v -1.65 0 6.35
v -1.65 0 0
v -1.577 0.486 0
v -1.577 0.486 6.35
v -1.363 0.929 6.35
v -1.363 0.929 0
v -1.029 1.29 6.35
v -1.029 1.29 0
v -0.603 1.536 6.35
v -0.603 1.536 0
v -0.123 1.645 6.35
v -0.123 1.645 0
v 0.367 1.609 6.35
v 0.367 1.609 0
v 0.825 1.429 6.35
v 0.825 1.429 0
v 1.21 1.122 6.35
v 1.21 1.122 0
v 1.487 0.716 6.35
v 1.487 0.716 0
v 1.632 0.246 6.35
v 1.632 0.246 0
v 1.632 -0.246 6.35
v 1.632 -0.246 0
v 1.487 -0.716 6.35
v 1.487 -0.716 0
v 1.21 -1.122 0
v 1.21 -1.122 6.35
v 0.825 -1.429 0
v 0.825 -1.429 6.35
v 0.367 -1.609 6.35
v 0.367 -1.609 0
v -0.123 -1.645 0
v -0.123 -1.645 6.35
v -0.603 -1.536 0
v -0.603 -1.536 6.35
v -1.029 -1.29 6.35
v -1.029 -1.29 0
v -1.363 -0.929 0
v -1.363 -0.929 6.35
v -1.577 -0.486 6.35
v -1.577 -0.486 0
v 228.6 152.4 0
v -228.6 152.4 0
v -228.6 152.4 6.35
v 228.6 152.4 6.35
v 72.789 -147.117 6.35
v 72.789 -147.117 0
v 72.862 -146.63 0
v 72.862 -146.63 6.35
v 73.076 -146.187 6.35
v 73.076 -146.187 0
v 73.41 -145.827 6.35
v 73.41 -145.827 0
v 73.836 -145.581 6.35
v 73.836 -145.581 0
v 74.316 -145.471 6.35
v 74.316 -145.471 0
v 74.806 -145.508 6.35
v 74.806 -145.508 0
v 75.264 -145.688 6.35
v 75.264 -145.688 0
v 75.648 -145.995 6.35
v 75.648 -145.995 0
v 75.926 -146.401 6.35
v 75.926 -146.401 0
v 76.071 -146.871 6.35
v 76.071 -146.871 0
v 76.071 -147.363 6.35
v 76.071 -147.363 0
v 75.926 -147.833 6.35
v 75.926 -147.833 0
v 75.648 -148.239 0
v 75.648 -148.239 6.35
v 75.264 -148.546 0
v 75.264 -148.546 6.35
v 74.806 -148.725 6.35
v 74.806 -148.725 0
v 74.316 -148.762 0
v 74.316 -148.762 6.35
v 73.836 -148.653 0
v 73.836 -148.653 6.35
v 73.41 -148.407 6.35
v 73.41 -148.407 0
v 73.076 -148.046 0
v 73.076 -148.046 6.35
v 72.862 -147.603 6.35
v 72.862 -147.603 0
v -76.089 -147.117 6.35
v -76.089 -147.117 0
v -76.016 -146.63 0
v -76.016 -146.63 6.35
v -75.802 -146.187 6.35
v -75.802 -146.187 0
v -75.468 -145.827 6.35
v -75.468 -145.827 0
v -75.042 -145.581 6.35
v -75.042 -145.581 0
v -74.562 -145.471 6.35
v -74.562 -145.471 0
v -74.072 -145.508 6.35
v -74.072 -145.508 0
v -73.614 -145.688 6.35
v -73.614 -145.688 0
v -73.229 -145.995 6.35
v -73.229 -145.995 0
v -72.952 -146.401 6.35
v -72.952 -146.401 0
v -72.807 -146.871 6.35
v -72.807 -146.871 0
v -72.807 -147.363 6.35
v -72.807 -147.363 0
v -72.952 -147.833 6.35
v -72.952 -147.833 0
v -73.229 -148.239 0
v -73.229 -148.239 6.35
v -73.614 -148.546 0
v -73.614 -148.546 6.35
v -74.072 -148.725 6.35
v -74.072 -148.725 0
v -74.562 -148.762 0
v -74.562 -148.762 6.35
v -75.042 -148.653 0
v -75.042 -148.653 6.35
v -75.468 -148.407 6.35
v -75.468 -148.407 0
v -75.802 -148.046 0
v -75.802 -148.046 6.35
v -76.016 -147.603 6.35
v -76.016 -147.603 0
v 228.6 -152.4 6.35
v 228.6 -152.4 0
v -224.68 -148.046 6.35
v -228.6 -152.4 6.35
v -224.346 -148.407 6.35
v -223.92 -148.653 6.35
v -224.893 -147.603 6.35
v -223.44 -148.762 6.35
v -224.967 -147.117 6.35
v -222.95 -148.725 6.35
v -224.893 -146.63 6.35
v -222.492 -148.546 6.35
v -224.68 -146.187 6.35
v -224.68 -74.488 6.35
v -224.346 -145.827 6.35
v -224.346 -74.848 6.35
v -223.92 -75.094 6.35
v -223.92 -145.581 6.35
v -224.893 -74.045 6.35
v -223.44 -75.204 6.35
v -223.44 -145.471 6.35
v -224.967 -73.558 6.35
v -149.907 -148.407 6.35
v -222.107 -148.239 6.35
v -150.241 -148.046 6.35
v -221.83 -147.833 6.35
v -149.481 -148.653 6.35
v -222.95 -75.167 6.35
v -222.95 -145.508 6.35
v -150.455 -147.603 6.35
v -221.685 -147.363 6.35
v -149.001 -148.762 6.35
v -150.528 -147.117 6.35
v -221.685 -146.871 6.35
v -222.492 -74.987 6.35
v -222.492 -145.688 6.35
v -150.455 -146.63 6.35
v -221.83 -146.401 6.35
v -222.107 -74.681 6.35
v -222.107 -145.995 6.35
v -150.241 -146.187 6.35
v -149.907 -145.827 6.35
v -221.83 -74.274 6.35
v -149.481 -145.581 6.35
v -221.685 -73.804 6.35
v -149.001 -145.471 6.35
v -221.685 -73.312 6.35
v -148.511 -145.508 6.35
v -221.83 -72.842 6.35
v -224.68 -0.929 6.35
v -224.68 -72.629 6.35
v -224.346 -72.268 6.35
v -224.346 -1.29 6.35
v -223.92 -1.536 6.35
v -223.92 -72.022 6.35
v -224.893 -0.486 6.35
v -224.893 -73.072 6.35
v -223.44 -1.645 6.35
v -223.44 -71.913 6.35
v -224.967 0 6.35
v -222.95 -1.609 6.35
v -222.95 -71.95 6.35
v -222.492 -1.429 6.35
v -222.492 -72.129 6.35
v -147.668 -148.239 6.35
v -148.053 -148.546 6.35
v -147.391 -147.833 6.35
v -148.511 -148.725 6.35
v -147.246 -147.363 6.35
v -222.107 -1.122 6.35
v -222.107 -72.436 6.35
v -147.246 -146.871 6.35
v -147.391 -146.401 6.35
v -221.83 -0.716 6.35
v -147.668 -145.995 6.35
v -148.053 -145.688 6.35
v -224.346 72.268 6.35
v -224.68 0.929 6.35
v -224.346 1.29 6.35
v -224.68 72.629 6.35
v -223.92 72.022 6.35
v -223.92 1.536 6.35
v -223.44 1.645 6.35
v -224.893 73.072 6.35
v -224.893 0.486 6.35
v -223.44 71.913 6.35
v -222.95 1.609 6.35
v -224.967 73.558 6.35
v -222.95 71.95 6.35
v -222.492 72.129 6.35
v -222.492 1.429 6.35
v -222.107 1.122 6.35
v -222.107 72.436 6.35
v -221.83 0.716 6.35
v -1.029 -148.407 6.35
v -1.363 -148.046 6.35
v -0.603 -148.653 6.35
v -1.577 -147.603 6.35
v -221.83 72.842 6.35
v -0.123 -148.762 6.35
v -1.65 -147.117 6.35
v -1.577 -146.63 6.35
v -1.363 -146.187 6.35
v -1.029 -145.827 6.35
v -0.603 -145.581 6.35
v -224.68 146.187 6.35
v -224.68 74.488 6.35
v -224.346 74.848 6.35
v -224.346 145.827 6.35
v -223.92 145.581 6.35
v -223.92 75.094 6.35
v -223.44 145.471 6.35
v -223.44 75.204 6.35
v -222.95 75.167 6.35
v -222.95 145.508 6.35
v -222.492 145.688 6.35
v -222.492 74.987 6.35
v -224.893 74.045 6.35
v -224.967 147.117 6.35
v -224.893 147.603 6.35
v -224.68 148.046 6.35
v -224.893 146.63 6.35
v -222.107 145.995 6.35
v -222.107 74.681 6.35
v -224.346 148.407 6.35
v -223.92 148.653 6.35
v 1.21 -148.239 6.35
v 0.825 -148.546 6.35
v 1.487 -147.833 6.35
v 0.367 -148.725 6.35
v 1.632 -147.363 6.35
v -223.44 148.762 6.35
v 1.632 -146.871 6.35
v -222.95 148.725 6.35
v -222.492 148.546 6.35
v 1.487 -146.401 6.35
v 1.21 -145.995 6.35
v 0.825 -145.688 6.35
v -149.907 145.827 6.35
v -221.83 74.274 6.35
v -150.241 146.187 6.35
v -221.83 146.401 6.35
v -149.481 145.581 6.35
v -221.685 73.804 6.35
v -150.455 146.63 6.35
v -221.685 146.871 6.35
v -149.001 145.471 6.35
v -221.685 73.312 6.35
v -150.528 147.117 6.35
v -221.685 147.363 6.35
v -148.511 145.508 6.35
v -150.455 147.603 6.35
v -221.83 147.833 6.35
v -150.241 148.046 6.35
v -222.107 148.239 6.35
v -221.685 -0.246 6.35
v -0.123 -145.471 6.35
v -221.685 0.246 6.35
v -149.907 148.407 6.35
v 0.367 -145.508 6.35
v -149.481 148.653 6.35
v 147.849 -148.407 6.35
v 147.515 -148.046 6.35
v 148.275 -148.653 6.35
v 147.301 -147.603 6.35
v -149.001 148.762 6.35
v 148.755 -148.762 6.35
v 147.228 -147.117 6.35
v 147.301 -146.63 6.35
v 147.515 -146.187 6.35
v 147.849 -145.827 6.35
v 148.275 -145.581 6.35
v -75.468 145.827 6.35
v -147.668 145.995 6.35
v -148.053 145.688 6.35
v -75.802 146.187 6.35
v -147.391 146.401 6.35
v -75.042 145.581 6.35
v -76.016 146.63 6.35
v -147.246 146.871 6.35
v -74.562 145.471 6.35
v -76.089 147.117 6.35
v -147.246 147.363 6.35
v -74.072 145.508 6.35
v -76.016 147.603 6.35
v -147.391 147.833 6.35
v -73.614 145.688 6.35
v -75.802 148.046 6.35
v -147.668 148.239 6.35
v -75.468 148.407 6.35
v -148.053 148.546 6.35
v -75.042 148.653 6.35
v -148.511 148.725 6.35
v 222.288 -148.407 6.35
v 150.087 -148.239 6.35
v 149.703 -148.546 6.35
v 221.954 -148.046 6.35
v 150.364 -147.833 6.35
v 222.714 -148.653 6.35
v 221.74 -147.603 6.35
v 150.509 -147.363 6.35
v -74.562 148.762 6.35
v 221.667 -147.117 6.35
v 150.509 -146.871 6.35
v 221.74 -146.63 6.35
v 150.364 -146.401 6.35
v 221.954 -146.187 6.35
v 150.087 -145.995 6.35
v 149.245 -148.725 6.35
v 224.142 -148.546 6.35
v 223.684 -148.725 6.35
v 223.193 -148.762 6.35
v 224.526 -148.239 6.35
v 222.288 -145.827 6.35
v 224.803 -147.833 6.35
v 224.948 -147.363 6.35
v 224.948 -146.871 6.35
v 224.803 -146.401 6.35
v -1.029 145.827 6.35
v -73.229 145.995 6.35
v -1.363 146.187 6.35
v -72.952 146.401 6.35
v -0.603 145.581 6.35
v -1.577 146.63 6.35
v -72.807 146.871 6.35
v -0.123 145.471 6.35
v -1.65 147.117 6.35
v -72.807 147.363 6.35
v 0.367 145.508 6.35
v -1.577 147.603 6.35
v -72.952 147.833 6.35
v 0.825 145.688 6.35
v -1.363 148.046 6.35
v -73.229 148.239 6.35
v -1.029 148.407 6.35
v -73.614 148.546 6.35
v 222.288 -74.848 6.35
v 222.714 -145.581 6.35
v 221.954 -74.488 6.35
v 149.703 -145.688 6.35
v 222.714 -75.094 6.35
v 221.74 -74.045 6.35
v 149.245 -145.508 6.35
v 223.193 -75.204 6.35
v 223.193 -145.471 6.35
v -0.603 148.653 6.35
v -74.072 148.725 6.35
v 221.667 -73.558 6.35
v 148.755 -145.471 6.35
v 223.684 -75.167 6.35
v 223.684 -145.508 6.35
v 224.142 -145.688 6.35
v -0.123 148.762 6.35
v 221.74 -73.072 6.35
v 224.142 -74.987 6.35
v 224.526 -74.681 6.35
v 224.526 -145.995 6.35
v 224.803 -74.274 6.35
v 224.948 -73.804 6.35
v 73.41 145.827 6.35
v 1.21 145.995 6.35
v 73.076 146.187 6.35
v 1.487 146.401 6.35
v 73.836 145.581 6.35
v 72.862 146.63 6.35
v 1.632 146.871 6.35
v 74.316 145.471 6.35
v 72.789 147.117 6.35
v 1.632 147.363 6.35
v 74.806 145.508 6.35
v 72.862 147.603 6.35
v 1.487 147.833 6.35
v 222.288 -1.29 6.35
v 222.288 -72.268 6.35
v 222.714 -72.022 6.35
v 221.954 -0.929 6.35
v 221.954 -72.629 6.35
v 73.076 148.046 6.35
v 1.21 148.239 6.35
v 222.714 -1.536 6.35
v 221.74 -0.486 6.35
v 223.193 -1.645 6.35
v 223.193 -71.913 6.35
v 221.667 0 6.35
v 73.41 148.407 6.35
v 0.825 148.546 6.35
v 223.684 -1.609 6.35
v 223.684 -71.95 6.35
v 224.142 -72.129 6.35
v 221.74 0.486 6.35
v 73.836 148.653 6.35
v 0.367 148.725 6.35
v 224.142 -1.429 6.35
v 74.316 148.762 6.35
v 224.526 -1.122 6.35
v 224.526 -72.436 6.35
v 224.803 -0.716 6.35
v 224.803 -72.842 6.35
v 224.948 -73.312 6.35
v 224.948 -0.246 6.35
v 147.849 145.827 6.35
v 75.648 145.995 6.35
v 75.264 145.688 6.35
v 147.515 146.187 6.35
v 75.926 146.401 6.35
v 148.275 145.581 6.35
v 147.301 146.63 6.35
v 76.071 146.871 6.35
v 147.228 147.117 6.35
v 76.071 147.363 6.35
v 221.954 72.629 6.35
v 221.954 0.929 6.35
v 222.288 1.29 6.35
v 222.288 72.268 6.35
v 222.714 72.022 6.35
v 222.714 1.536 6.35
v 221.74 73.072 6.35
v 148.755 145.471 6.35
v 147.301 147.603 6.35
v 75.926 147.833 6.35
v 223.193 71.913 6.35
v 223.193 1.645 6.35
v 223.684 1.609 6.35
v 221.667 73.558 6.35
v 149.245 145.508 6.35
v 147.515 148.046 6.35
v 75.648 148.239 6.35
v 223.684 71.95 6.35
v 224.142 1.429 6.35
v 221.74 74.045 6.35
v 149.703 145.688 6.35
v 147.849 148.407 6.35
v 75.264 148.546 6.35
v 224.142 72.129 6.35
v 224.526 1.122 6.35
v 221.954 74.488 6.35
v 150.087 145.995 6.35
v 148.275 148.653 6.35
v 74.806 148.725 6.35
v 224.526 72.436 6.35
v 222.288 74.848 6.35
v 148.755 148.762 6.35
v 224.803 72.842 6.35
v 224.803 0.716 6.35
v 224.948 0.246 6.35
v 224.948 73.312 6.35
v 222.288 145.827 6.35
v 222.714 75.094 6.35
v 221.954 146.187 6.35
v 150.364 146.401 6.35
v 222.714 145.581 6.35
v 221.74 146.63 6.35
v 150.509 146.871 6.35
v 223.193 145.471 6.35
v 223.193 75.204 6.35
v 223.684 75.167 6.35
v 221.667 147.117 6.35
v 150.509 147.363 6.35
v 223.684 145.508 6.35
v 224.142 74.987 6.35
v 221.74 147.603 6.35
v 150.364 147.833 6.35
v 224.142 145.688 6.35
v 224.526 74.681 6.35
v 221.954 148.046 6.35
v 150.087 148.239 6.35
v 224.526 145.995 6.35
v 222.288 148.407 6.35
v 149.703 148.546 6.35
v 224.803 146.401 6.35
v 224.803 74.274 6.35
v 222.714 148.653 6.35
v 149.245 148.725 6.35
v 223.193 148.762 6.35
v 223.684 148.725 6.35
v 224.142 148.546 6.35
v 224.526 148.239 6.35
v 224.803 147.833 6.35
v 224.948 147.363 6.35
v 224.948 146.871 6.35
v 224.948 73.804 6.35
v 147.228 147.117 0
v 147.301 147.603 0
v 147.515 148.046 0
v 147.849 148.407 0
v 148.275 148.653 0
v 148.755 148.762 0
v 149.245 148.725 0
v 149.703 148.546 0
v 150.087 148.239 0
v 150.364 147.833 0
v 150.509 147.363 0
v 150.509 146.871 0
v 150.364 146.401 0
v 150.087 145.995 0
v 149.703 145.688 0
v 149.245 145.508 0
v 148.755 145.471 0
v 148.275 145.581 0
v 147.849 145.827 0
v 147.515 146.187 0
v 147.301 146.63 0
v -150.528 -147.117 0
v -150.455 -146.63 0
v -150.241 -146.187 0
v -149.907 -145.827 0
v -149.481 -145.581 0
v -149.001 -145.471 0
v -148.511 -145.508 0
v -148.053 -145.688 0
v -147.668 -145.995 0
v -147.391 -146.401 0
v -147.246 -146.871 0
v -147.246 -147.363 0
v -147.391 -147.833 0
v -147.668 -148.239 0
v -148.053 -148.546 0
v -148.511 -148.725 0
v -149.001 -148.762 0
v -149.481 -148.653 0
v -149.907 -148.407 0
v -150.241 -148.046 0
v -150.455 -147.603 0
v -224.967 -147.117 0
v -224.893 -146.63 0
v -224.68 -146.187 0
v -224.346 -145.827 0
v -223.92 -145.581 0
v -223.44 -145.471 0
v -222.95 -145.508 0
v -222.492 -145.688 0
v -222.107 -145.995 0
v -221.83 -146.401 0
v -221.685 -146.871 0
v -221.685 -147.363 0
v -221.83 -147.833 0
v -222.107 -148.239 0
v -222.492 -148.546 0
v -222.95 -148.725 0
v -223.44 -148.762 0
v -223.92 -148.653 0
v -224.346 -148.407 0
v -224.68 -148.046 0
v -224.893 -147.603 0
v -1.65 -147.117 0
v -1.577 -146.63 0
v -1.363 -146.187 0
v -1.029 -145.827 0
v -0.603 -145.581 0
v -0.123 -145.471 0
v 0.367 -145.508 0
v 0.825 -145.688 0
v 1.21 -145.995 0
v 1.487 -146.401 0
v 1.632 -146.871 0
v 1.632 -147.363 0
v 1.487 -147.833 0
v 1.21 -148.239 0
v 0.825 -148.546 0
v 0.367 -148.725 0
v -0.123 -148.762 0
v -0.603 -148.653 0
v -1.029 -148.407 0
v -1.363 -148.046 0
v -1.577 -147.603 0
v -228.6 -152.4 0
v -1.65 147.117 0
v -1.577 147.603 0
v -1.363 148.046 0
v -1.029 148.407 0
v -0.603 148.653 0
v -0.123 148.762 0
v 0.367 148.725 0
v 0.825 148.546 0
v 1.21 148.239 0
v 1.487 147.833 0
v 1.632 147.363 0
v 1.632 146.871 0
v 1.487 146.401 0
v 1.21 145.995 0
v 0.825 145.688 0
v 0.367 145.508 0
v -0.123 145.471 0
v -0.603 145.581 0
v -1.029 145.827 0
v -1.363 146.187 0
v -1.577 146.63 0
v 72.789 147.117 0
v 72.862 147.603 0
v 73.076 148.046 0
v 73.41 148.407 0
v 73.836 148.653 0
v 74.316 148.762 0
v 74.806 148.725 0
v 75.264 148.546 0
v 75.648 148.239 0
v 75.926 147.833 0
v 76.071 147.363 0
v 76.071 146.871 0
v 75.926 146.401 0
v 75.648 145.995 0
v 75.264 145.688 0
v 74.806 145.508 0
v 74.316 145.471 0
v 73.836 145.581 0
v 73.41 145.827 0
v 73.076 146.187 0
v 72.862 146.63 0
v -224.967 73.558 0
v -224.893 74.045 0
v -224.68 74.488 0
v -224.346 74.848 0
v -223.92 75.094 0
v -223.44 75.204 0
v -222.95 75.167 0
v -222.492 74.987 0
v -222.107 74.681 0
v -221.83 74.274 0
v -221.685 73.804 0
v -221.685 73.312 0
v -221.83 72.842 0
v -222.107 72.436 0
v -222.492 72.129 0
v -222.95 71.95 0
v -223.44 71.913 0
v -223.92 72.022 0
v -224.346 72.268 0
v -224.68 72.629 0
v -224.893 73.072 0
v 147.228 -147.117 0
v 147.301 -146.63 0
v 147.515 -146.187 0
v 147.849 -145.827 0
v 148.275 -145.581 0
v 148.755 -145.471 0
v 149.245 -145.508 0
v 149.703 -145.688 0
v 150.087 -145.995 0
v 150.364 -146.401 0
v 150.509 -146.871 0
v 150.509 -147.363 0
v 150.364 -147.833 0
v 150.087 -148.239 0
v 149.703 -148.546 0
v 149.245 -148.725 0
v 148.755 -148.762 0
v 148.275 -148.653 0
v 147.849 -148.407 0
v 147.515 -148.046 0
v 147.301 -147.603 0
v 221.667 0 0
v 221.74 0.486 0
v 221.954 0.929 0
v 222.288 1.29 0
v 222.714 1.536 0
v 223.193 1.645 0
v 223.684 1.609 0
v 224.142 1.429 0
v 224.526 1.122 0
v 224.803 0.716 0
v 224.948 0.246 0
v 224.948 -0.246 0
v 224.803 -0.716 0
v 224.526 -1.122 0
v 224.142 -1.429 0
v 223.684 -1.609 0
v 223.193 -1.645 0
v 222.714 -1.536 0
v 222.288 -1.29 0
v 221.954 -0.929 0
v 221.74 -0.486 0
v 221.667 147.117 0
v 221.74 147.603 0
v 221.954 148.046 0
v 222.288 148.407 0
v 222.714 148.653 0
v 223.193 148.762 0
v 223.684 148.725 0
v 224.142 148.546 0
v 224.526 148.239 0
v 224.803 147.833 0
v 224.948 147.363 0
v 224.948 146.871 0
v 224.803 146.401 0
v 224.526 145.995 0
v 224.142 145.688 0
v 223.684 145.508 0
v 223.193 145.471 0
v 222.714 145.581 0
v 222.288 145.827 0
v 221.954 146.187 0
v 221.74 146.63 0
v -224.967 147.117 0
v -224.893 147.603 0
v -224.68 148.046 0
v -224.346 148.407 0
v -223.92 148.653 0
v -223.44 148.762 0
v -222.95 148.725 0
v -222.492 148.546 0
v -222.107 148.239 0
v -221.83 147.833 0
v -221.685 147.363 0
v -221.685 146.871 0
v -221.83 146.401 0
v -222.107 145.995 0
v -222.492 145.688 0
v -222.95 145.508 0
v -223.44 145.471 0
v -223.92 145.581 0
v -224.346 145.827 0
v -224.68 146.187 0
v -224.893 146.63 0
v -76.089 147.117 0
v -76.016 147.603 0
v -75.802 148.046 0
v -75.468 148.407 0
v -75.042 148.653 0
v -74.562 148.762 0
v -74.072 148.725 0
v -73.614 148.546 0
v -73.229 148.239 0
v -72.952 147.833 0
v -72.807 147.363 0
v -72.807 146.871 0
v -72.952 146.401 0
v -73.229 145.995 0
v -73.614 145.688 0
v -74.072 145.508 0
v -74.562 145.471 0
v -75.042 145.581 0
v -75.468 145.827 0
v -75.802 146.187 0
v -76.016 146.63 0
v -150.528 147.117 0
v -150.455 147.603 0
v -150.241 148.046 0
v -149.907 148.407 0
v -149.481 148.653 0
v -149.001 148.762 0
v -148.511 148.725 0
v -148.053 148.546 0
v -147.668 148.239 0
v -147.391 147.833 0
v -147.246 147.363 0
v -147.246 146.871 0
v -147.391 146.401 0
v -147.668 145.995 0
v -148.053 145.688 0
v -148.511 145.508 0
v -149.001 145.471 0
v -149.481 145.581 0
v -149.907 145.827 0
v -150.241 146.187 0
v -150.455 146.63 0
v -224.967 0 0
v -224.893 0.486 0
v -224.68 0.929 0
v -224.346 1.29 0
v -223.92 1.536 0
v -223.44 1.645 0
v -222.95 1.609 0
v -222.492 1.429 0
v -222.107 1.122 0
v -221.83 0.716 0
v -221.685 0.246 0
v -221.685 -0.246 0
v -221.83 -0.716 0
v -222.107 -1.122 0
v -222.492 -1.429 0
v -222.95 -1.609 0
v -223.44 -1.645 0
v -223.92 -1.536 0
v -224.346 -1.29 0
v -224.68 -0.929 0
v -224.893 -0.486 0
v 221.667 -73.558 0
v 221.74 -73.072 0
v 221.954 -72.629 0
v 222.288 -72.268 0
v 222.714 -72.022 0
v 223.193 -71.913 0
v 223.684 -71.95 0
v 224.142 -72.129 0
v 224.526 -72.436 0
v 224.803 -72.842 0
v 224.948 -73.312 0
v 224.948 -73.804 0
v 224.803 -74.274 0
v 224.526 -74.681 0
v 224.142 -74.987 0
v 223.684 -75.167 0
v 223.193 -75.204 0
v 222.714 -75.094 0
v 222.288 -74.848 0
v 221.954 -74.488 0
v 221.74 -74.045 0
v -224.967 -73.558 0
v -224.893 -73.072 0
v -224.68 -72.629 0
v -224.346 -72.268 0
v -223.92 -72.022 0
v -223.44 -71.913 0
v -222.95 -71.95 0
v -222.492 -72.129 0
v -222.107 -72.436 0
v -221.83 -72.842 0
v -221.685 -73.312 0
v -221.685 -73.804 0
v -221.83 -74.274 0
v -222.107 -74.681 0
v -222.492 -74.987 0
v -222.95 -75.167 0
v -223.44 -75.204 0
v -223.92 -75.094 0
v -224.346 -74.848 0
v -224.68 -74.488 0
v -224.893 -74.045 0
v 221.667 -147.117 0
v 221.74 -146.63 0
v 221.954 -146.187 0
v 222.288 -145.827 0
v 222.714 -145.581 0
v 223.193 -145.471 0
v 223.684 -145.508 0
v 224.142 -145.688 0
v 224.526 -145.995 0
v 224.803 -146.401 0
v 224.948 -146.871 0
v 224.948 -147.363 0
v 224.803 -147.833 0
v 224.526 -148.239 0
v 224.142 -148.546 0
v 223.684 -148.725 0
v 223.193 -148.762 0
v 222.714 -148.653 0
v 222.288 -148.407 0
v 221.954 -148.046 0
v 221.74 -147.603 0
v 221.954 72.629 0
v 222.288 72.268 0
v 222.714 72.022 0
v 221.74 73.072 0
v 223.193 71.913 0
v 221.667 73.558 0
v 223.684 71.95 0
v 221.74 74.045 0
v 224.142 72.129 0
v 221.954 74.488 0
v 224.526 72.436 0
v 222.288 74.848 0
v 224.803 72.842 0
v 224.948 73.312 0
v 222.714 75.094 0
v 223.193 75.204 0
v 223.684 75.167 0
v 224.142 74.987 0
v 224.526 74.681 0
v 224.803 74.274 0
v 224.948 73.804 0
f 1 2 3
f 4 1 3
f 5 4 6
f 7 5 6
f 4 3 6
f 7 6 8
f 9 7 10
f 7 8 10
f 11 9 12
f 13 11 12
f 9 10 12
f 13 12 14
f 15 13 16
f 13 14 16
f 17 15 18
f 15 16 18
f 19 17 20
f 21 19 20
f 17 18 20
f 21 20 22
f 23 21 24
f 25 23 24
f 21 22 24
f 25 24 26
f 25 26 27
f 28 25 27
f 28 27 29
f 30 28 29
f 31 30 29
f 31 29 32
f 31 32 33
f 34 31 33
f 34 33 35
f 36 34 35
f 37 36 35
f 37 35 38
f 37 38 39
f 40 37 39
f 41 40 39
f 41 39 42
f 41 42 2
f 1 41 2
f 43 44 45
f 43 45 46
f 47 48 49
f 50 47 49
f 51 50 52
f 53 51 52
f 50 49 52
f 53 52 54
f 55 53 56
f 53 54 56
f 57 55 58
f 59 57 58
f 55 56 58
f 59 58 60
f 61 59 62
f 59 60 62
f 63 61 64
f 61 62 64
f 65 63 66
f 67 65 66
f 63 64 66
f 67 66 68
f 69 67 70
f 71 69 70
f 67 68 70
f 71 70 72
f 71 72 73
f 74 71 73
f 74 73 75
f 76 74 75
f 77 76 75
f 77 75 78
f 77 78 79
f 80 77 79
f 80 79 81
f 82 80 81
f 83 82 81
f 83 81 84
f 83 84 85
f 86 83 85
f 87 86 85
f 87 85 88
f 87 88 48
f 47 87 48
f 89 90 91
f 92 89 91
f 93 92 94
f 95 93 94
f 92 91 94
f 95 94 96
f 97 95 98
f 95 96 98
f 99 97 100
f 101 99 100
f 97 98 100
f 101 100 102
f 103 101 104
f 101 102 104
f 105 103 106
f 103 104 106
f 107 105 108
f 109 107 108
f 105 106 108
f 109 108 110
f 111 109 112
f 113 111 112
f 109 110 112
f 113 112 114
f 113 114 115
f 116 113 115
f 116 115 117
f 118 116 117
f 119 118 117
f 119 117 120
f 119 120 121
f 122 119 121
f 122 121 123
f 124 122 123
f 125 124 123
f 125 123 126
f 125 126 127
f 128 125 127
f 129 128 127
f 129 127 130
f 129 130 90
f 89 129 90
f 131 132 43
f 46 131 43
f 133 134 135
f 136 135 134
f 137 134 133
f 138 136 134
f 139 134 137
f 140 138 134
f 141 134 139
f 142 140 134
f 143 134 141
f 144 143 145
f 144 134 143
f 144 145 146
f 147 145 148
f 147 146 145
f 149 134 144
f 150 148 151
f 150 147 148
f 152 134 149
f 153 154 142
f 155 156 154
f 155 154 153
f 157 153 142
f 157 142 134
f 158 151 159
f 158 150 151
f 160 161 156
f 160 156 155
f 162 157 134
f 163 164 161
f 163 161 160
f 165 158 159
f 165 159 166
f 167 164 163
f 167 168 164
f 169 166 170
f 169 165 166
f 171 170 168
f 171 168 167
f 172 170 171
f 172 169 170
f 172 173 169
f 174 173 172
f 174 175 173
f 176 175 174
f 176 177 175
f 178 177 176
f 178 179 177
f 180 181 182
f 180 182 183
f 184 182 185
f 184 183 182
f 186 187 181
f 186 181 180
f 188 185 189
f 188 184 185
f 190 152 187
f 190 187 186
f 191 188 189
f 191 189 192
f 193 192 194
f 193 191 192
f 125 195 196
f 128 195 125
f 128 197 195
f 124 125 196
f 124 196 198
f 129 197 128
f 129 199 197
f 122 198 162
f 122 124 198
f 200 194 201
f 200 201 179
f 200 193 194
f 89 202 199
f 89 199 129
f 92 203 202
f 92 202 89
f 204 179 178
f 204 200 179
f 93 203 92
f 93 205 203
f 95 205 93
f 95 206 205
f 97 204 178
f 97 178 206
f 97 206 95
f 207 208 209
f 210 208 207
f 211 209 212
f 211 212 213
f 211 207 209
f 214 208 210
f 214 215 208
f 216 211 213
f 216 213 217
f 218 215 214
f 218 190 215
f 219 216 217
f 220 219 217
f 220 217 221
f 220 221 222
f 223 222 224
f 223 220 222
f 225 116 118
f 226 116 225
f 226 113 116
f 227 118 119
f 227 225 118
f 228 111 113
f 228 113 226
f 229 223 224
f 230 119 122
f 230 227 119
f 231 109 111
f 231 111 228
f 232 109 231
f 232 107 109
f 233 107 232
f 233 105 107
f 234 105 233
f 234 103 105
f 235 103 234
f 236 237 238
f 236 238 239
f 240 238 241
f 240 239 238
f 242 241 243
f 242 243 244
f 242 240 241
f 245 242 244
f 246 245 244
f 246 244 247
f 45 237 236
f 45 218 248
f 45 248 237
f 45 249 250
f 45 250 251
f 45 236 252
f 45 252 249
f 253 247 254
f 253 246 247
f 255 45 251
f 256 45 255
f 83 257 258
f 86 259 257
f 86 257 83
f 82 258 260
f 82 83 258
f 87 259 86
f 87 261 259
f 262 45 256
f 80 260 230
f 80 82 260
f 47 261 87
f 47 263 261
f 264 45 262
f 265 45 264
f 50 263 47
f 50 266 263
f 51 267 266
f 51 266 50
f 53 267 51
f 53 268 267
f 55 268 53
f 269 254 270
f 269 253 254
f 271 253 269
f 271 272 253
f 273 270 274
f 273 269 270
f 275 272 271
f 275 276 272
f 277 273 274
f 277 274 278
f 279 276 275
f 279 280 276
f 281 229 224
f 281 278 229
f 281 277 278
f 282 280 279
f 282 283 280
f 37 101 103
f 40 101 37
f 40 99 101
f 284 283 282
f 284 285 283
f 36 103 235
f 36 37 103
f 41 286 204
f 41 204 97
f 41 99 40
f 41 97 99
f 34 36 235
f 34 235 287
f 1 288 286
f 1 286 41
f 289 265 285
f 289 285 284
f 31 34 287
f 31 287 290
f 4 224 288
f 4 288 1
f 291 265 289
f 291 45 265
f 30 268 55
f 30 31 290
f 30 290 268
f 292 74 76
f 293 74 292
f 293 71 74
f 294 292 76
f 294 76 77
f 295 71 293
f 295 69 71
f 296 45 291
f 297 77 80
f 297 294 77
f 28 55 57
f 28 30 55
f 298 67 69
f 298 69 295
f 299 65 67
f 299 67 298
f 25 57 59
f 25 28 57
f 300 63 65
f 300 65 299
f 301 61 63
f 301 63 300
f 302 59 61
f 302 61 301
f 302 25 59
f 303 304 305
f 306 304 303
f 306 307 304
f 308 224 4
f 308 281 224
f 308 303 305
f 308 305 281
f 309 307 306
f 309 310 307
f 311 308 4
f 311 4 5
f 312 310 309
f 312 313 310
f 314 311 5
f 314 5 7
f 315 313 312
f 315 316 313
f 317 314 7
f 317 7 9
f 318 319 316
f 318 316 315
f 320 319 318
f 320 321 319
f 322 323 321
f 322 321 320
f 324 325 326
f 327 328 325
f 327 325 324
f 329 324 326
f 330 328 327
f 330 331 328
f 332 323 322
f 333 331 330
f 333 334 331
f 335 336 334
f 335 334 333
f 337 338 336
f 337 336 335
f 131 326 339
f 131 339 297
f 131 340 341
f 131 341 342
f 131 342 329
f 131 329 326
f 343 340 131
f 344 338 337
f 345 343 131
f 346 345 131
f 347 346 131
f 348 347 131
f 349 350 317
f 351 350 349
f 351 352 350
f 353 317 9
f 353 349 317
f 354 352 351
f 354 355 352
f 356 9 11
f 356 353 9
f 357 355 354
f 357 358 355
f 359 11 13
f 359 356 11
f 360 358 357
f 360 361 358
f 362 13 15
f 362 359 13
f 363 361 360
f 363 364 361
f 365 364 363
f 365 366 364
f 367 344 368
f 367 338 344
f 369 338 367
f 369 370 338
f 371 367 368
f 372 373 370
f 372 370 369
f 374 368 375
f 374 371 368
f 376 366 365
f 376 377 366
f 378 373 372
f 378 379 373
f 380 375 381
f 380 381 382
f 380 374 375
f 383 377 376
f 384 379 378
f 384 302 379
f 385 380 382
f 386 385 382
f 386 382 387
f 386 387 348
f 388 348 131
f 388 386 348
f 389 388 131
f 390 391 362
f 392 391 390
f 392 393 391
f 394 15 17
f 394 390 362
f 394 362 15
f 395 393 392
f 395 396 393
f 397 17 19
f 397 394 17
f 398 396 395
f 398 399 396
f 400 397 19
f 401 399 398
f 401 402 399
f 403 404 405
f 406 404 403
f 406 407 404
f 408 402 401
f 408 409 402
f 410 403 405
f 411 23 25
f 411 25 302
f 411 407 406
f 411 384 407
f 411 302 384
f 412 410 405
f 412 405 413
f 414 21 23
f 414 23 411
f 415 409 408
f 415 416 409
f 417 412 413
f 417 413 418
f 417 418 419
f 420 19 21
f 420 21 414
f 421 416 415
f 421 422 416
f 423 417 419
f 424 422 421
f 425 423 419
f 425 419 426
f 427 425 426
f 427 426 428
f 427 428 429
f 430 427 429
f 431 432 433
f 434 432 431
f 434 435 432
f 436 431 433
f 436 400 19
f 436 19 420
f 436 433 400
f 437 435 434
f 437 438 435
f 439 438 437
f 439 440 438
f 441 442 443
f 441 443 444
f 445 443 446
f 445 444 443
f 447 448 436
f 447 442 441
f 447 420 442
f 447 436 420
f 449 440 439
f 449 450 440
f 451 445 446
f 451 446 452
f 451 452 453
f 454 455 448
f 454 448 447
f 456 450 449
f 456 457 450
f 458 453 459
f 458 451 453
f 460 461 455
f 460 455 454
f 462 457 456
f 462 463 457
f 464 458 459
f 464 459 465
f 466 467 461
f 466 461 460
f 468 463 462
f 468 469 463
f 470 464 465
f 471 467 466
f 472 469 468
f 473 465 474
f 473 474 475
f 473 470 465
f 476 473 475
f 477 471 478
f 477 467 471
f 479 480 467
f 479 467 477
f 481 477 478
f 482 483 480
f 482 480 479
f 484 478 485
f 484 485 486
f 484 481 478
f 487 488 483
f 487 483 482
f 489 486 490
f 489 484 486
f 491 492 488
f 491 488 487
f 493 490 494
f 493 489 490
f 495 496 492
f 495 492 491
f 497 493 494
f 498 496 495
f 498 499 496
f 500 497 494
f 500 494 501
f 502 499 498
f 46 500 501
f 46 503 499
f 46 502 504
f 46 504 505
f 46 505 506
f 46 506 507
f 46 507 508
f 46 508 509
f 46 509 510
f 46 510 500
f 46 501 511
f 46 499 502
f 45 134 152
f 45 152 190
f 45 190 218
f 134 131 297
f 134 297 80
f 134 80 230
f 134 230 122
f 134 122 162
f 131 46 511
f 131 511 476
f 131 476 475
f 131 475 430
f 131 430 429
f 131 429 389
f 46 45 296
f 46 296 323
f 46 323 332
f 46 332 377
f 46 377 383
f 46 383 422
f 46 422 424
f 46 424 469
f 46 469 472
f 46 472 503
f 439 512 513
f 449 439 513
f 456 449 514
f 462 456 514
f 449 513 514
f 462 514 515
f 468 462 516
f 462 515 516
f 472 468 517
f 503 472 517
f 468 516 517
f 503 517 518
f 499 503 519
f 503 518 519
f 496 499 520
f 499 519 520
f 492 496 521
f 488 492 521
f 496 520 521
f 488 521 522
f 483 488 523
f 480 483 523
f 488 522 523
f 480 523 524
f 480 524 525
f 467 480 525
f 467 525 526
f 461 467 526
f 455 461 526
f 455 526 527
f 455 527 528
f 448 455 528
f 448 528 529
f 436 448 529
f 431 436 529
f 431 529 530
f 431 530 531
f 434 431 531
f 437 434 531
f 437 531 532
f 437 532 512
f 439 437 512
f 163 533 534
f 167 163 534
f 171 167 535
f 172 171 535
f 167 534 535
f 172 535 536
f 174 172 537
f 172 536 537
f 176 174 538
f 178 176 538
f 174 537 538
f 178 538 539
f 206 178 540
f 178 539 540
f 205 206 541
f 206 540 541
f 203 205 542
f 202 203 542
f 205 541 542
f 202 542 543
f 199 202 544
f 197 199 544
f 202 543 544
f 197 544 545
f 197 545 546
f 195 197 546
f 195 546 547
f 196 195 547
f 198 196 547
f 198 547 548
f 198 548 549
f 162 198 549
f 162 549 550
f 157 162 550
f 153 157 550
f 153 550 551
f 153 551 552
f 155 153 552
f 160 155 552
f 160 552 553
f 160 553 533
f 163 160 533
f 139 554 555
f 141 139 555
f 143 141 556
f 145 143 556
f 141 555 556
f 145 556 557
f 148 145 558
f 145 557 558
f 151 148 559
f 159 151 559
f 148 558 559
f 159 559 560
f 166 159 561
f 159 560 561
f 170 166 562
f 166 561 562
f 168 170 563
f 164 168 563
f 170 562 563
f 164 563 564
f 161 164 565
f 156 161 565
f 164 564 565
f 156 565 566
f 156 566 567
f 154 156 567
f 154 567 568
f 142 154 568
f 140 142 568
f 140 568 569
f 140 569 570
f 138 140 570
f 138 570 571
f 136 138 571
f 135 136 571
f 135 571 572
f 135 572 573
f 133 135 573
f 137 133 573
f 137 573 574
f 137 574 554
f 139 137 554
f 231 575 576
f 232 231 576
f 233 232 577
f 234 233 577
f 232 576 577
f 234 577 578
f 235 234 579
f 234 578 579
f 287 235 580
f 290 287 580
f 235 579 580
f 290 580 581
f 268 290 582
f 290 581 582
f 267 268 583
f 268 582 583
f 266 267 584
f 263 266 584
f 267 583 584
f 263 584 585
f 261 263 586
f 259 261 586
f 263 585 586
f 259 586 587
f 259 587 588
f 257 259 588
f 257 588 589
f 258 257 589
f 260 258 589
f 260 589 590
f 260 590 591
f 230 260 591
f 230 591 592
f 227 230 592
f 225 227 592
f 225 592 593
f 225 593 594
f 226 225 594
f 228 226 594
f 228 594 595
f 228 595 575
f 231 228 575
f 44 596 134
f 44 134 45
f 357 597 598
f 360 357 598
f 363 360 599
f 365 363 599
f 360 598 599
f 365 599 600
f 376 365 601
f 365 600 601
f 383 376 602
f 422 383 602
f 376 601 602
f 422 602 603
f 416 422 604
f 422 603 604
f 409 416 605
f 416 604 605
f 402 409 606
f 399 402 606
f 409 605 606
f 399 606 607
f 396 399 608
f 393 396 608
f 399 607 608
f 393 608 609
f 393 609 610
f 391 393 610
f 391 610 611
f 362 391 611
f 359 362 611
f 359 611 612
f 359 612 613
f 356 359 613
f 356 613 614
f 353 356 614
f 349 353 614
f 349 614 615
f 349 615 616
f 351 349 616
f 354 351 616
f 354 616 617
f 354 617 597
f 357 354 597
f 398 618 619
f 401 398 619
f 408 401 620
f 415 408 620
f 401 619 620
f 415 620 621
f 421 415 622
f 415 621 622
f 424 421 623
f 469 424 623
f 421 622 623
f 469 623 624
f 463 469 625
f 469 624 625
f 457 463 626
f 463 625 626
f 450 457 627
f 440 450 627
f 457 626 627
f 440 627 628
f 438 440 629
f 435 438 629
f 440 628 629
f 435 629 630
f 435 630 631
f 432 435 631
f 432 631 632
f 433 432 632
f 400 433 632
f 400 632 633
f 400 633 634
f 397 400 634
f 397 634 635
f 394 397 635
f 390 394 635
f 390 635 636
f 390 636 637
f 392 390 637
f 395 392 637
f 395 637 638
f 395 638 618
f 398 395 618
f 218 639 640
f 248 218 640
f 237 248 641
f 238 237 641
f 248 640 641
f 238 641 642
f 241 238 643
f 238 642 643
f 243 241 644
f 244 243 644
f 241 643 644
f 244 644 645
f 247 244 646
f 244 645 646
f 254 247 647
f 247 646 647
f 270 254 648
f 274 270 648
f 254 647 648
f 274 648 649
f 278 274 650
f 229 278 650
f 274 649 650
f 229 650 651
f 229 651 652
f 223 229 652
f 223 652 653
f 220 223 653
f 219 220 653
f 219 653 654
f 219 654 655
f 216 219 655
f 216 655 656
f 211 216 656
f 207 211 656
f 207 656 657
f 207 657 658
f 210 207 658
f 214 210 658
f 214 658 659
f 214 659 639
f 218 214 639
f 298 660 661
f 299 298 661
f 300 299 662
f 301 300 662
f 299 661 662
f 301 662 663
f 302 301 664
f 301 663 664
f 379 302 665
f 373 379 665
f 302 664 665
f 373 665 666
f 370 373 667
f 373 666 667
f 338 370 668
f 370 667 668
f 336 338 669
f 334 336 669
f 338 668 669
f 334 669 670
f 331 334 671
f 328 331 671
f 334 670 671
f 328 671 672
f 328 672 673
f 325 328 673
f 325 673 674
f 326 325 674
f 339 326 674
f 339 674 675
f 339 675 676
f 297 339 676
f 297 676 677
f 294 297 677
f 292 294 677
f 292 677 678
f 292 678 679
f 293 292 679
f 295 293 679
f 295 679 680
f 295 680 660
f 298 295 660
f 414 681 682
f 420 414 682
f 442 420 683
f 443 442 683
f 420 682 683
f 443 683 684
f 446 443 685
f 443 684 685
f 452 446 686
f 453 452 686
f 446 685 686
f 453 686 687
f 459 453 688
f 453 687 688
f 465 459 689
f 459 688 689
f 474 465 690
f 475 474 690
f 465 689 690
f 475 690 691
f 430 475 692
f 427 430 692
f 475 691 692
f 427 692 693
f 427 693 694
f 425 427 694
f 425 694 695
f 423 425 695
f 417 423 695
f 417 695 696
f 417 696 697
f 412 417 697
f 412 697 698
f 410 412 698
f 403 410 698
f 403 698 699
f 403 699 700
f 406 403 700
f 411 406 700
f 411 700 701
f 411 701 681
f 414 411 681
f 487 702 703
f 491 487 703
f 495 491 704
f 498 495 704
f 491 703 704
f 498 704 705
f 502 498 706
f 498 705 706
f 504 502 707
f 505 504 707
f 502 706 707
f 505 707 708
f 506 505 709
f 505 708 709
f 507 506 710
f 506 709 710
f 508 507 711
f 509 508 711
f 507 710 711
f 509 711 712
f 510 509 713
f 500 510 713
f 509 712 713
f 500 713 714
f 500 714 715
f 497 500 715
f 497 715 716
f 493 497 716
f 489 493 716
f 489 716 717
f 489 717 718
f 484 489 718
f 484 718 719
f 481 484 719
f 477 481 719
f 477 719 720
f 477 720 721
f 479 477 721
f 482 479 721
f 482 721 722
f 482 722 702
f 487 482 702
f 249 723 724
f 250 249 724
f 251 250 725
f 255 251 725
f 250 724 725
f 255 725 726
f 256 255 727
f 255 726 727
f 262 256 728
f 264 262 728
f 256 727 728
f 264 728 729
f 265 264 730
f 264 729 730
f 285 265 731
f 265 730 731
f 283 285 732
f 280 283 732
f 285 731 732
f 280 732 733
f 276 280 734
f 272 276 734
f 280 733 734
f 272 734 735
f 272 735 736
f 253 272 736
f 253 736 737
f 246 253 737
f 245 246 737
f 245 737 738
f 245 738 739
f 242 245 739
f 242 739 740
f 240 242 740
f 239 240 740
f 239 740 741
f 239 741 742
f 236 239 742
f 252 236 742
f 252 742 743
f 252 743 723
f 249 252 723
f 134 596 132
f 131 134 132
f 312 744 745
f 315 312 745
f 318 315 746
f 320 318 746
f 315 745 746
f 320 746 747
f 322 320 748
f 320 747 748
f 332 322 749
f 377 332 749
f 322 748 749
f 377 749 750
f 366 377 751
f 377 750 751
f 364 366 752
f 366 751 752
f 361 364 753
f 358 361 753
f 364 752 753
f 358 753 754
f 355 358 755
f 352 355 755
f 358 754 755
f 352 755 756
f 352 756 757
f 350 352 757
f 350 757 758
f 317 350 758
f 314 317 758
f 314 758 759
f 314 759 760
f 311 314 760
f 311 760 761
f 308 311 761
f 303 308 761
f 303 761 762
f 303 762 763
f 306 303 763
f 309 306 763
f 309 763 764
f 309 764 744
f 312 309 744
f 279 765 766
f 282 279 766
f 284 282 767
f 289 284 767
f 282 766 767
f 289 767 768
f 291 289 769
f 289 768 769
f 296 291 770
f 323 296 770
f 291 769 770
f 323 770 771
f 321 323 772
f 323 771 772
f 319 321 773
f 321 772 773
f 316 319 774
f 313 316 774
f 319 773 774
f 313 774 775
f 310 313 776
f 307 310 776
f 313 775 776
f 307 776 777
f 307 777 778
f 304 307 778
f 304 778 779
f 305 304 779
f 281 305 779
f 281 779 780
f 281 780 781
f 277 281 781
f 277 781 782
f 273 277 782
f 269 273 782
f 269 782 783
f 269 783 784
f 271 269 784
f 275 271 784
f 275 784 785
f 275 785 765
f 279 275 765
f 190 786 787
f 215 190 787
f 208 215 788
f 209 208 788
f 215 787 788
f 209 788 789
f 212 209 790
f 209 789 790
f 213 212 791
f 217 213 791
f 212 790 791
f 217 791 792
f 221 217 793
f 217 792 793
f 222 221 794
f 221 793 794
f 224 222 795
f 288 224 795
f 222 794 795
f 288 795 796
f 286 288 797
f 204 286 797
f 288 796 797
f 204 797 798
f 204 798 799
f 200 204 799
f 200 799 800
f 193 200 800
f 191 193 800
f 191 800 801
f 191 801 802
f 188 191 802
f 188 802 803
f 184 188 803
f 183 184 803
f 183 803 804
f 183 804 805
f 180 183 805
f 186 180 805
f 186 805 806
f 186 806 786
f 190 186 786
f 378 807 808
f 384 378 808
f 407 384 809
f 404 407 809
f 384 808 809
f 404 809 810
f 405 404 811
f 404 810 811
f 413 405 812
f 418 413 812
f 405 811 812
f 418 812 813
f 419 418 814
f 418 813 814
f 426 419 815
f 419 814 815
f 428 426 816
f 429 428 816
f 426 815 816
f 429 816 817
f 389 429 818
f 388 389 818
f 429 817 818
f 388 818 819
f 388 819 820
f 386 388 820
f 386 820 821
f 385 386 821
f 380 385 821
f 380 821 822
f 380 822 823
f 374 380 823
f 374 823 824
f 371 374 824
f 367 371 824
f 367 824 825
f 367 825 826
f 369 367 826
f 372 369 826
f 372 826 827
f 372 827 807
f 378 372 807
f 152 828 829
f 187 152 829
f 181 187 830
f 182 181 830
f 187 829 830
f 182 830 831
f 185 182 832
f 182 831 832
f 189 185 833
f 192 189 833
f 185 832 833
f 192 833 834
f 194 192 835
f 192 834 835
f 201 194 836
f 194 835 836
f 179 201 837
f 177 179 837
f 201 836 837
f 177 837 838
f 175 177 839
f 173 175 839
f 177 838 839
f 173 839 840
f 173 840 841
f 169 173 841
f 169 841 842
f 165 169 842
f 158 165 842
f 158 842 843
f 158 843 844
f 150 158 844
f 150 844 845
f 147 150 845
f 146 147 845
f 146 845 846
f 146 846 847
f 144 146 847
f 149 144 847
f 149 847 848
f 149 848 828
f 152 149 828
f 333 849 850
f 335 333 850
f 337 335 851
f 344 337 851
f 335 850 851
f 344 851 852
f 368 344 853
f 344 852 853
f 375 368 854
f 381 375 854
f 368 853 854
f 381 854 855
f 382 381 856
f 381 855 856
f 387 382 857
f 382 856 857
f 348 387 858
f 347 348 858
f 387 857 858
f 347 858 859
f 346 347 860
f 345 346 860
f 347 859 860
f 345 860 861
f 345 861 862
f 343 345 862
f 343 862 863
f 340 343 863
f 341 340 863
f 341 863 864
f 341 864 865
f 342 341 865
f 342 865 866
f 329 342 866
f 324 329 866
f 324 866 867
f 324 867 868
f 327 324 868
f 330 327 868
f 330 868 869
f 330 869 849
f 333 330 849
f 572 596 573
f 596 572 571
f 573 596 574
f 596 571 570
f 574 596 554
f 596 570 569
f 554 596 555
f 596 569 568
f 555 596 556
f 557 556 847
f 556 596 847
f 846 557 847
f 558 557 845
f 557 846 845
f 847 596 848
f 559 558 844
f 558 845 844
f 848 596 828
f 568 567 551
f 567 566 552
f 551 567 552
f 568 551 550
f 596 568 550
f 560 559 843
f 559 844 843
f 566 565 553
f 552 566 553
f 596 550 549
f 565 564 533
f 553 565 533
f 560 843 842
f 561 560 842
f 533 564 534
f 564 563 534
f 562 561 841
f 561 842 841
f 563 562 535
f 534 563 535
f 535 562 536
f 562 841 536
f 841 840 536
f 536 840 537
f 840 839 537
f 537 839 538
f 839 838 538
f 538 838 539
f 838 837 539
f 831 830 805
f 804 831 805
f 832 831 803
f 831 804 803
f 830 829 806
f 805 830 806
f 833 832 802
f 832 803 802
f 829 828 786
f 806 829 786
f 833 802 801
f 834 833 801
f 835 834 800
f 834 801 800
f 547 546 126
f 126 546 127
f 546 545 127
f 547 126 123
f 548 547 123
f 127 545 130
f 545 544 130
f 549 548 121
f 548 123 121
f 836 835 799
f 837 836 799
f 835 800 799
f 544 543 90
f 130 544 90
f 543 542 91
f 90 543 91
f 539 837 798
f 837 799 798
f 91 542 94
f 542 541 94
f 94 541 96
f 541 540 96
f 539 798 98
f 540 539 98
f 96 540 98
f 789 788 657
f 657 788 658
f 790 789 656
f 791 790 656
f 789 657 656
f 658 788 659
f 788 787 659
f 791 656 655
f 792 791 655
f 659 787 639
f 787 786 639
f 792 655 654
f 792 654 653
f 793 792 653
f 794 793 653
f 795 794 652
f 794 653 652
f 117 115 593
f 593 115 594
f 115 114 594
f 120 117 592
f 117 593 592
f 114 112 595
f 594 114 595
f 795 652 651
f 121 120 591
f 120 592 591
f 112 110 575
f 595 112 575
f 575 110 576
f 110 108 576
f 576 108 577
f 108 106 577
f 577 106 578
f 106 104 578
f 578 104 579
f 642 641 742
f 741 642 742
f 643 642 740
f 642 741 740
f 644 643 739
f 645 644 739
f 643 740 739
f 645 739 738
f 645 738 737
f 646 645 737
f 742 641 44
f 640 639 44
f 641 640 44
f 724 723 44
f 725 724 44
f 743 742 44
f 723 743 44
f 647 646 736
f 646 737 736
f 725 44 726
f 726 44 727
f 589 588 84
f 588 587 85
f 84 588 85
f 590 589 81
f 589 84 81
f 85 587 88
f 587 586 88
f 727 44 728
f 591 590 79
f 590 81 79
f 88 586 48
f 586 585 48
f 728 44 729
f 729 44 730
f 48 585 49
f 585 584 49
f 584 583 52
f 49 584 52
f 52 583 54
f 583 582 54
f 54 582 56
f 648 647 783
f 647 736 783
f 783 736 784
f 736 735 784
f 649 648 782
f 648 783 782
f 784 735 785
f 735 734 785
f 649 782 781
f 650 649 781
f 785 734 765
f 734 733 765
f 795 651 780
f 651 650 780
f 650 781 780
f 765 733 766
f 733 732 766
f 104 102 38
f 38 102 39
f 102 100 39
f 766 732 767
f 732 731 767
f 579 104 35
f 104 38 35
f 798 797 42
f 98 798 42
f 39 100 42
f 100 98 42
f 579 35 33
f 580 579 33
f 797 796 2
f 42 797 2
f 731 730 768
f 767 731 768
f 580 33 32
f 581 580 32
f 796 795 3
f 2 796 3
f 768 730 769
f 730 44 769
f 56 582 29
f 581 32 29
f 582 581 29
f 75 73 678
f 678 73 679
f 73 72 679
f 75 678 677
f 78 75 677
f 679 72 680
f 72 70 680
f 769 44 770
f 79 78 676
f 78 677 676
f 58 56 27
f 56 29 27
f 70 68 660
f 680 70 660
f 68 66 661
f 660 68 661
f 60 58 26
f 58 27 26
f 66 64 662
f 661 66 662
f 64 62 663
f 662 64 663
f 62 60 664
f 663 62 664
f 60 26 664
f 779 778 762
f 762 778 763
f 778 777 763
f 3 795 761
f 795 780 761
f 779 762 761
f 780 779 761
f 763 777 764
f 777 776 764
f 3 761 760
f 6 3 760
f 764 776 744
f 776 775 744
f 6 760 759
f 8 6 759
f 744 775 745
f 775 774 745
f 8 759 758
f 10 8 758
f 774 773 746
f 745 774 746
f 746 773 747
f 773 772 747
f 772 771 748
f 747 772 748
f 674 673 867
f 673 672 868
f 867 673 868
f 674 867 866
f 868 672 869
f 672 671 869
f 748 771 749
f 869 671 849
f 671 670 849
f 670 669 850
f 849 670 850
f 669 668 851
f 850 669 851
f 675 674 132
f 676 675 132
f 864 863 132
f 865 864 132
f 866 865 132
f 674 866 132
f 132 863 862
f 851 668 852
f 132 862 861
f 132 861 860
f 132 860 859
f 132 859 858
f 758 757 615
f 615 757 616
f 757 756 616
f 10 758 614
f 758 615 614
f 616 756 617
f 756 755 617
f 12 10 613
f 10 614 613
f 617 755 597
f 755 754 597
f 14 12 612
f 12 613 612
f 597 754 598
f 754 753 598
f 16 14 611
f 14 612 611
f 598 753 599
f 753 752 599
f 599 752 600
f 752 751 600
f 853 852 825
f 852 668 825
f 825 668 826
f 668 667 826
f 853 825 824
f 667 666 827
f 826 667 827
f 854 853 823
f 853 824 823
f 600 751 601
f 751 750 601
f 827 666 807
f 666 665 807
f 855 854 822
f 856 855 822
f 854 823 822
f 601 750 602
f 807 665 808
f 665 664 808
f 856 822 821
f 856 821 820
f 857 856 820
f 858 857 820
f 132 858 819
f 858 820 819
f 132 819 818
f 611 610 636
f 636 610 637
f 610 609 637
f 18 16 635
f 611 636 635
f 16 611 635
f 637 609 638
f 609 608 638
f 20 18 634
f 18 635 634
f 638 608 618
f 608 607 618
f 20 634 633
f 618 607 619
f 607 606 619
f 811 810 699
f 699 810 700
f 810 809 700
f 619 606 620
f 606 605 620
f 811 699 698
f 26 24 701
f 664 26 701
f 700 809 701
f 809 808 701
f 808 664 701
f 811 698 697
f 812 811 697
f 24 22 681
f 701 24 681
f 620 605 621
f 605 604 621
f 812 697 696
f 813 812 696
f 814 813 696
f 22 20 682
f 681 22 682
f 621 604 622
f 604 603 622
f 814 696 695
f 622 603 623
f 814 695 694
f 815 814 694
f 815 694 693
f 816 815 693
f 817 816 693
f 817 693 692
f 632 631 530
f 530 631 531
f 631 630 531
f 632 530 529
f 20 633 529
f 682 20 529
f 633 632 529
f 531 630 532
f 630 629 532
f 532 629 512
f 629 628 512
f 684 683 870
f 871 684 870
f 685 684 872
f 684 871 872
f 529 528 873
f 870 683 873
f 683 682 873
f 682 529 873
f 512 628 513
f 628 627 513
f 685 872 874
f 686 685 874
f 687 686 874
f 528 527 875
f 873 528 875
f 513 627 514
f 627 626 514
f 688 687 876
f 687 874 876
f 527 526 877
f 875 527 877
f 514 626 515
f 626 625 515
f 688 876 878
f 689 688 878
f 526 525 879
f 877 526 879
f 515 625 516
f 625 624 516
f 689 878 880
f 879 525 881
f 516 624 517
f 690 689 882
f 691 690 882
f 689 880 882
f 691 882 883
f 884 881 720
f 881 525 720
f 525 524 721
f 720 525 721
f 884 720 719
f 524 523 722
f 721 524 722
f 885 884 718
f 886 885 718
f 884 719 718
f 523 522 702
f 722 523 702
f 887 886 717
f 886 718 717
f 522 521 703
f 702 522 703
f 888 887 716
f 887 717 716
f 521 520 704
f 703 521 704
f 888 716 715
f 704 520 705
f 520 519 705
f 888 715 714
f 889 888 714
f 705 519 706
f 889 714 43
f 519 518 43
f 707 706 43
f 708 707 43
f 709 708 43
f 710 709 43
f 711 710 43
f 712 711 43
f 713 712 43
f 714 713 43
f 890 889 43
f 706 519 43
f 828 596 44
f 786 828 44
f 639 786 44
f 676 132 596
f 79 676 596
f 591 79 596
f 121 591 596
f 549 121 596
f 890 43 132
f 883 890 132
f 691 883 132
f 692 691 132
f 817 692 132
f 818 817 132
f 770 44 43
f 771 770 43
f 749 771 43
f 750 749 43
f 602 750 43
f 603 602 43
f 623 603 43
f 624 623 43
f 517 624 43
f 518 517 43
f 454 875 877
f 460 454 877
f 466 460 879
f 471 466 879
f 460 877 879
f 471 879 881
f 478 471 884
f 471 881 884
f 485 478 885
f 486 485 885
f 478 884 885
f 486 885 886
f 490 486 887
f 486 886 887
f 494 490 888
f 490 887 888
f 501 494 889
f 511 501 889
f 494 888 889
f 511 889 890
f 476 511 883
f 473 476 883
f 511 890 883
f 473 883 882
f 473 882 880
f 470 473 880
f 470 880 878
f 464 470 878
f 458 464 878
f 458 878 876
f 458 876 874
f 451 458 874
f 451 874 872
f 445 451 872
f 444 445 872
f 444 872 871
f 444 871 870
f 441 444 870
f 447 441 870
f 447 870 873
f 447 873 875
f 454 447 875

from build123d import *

# Parameters (mm, degrees)
F1_W     = 457.2
F1_H     = 304.8
F2_DEPTH = 6.35
F4_D     = 3.3


# Not quite as in the source:
# - a variable given as a bare number and used for a length is read in inches; the dataset says mm whatever the document's units were


with BuildPart() as f2:
    # F1 (on Top) → F2 (new body)
    with BuildSketch(Plane.XY):
        Rectangle(F1_W, F1_H)
    extrude(amount=F2_DEPTH)

    # F4 (through all)
    with Locations(Plane.XY.offset(6.35)):
        with Locations((-223.3168, 147.1168), (-148.8778666667, 147.1168), (-74.4389333333, 147.1168), (0, 147.1168), (74.4389333333, 147.1168), (148.8778666667, 147.1168), (223.3168, 147.1168), (223.3168, 73.5584), (223.3168, 0), (223.3168, -73.5584), (223.3168, -147.1168), (148.8778666667, -147.1168), (74.4389333333, -147.1168), (0, -147.1168), (-74.4389333333, -147.1168), (-148.8778666667, -147.1168), (-223.3168, -73.5584), (-223.3168, -147.1168), (-223.3168, 0), (-223.3168, 73.5584), (0, 0)):
            Hole(F4_D / 2)


solid = f2.part
